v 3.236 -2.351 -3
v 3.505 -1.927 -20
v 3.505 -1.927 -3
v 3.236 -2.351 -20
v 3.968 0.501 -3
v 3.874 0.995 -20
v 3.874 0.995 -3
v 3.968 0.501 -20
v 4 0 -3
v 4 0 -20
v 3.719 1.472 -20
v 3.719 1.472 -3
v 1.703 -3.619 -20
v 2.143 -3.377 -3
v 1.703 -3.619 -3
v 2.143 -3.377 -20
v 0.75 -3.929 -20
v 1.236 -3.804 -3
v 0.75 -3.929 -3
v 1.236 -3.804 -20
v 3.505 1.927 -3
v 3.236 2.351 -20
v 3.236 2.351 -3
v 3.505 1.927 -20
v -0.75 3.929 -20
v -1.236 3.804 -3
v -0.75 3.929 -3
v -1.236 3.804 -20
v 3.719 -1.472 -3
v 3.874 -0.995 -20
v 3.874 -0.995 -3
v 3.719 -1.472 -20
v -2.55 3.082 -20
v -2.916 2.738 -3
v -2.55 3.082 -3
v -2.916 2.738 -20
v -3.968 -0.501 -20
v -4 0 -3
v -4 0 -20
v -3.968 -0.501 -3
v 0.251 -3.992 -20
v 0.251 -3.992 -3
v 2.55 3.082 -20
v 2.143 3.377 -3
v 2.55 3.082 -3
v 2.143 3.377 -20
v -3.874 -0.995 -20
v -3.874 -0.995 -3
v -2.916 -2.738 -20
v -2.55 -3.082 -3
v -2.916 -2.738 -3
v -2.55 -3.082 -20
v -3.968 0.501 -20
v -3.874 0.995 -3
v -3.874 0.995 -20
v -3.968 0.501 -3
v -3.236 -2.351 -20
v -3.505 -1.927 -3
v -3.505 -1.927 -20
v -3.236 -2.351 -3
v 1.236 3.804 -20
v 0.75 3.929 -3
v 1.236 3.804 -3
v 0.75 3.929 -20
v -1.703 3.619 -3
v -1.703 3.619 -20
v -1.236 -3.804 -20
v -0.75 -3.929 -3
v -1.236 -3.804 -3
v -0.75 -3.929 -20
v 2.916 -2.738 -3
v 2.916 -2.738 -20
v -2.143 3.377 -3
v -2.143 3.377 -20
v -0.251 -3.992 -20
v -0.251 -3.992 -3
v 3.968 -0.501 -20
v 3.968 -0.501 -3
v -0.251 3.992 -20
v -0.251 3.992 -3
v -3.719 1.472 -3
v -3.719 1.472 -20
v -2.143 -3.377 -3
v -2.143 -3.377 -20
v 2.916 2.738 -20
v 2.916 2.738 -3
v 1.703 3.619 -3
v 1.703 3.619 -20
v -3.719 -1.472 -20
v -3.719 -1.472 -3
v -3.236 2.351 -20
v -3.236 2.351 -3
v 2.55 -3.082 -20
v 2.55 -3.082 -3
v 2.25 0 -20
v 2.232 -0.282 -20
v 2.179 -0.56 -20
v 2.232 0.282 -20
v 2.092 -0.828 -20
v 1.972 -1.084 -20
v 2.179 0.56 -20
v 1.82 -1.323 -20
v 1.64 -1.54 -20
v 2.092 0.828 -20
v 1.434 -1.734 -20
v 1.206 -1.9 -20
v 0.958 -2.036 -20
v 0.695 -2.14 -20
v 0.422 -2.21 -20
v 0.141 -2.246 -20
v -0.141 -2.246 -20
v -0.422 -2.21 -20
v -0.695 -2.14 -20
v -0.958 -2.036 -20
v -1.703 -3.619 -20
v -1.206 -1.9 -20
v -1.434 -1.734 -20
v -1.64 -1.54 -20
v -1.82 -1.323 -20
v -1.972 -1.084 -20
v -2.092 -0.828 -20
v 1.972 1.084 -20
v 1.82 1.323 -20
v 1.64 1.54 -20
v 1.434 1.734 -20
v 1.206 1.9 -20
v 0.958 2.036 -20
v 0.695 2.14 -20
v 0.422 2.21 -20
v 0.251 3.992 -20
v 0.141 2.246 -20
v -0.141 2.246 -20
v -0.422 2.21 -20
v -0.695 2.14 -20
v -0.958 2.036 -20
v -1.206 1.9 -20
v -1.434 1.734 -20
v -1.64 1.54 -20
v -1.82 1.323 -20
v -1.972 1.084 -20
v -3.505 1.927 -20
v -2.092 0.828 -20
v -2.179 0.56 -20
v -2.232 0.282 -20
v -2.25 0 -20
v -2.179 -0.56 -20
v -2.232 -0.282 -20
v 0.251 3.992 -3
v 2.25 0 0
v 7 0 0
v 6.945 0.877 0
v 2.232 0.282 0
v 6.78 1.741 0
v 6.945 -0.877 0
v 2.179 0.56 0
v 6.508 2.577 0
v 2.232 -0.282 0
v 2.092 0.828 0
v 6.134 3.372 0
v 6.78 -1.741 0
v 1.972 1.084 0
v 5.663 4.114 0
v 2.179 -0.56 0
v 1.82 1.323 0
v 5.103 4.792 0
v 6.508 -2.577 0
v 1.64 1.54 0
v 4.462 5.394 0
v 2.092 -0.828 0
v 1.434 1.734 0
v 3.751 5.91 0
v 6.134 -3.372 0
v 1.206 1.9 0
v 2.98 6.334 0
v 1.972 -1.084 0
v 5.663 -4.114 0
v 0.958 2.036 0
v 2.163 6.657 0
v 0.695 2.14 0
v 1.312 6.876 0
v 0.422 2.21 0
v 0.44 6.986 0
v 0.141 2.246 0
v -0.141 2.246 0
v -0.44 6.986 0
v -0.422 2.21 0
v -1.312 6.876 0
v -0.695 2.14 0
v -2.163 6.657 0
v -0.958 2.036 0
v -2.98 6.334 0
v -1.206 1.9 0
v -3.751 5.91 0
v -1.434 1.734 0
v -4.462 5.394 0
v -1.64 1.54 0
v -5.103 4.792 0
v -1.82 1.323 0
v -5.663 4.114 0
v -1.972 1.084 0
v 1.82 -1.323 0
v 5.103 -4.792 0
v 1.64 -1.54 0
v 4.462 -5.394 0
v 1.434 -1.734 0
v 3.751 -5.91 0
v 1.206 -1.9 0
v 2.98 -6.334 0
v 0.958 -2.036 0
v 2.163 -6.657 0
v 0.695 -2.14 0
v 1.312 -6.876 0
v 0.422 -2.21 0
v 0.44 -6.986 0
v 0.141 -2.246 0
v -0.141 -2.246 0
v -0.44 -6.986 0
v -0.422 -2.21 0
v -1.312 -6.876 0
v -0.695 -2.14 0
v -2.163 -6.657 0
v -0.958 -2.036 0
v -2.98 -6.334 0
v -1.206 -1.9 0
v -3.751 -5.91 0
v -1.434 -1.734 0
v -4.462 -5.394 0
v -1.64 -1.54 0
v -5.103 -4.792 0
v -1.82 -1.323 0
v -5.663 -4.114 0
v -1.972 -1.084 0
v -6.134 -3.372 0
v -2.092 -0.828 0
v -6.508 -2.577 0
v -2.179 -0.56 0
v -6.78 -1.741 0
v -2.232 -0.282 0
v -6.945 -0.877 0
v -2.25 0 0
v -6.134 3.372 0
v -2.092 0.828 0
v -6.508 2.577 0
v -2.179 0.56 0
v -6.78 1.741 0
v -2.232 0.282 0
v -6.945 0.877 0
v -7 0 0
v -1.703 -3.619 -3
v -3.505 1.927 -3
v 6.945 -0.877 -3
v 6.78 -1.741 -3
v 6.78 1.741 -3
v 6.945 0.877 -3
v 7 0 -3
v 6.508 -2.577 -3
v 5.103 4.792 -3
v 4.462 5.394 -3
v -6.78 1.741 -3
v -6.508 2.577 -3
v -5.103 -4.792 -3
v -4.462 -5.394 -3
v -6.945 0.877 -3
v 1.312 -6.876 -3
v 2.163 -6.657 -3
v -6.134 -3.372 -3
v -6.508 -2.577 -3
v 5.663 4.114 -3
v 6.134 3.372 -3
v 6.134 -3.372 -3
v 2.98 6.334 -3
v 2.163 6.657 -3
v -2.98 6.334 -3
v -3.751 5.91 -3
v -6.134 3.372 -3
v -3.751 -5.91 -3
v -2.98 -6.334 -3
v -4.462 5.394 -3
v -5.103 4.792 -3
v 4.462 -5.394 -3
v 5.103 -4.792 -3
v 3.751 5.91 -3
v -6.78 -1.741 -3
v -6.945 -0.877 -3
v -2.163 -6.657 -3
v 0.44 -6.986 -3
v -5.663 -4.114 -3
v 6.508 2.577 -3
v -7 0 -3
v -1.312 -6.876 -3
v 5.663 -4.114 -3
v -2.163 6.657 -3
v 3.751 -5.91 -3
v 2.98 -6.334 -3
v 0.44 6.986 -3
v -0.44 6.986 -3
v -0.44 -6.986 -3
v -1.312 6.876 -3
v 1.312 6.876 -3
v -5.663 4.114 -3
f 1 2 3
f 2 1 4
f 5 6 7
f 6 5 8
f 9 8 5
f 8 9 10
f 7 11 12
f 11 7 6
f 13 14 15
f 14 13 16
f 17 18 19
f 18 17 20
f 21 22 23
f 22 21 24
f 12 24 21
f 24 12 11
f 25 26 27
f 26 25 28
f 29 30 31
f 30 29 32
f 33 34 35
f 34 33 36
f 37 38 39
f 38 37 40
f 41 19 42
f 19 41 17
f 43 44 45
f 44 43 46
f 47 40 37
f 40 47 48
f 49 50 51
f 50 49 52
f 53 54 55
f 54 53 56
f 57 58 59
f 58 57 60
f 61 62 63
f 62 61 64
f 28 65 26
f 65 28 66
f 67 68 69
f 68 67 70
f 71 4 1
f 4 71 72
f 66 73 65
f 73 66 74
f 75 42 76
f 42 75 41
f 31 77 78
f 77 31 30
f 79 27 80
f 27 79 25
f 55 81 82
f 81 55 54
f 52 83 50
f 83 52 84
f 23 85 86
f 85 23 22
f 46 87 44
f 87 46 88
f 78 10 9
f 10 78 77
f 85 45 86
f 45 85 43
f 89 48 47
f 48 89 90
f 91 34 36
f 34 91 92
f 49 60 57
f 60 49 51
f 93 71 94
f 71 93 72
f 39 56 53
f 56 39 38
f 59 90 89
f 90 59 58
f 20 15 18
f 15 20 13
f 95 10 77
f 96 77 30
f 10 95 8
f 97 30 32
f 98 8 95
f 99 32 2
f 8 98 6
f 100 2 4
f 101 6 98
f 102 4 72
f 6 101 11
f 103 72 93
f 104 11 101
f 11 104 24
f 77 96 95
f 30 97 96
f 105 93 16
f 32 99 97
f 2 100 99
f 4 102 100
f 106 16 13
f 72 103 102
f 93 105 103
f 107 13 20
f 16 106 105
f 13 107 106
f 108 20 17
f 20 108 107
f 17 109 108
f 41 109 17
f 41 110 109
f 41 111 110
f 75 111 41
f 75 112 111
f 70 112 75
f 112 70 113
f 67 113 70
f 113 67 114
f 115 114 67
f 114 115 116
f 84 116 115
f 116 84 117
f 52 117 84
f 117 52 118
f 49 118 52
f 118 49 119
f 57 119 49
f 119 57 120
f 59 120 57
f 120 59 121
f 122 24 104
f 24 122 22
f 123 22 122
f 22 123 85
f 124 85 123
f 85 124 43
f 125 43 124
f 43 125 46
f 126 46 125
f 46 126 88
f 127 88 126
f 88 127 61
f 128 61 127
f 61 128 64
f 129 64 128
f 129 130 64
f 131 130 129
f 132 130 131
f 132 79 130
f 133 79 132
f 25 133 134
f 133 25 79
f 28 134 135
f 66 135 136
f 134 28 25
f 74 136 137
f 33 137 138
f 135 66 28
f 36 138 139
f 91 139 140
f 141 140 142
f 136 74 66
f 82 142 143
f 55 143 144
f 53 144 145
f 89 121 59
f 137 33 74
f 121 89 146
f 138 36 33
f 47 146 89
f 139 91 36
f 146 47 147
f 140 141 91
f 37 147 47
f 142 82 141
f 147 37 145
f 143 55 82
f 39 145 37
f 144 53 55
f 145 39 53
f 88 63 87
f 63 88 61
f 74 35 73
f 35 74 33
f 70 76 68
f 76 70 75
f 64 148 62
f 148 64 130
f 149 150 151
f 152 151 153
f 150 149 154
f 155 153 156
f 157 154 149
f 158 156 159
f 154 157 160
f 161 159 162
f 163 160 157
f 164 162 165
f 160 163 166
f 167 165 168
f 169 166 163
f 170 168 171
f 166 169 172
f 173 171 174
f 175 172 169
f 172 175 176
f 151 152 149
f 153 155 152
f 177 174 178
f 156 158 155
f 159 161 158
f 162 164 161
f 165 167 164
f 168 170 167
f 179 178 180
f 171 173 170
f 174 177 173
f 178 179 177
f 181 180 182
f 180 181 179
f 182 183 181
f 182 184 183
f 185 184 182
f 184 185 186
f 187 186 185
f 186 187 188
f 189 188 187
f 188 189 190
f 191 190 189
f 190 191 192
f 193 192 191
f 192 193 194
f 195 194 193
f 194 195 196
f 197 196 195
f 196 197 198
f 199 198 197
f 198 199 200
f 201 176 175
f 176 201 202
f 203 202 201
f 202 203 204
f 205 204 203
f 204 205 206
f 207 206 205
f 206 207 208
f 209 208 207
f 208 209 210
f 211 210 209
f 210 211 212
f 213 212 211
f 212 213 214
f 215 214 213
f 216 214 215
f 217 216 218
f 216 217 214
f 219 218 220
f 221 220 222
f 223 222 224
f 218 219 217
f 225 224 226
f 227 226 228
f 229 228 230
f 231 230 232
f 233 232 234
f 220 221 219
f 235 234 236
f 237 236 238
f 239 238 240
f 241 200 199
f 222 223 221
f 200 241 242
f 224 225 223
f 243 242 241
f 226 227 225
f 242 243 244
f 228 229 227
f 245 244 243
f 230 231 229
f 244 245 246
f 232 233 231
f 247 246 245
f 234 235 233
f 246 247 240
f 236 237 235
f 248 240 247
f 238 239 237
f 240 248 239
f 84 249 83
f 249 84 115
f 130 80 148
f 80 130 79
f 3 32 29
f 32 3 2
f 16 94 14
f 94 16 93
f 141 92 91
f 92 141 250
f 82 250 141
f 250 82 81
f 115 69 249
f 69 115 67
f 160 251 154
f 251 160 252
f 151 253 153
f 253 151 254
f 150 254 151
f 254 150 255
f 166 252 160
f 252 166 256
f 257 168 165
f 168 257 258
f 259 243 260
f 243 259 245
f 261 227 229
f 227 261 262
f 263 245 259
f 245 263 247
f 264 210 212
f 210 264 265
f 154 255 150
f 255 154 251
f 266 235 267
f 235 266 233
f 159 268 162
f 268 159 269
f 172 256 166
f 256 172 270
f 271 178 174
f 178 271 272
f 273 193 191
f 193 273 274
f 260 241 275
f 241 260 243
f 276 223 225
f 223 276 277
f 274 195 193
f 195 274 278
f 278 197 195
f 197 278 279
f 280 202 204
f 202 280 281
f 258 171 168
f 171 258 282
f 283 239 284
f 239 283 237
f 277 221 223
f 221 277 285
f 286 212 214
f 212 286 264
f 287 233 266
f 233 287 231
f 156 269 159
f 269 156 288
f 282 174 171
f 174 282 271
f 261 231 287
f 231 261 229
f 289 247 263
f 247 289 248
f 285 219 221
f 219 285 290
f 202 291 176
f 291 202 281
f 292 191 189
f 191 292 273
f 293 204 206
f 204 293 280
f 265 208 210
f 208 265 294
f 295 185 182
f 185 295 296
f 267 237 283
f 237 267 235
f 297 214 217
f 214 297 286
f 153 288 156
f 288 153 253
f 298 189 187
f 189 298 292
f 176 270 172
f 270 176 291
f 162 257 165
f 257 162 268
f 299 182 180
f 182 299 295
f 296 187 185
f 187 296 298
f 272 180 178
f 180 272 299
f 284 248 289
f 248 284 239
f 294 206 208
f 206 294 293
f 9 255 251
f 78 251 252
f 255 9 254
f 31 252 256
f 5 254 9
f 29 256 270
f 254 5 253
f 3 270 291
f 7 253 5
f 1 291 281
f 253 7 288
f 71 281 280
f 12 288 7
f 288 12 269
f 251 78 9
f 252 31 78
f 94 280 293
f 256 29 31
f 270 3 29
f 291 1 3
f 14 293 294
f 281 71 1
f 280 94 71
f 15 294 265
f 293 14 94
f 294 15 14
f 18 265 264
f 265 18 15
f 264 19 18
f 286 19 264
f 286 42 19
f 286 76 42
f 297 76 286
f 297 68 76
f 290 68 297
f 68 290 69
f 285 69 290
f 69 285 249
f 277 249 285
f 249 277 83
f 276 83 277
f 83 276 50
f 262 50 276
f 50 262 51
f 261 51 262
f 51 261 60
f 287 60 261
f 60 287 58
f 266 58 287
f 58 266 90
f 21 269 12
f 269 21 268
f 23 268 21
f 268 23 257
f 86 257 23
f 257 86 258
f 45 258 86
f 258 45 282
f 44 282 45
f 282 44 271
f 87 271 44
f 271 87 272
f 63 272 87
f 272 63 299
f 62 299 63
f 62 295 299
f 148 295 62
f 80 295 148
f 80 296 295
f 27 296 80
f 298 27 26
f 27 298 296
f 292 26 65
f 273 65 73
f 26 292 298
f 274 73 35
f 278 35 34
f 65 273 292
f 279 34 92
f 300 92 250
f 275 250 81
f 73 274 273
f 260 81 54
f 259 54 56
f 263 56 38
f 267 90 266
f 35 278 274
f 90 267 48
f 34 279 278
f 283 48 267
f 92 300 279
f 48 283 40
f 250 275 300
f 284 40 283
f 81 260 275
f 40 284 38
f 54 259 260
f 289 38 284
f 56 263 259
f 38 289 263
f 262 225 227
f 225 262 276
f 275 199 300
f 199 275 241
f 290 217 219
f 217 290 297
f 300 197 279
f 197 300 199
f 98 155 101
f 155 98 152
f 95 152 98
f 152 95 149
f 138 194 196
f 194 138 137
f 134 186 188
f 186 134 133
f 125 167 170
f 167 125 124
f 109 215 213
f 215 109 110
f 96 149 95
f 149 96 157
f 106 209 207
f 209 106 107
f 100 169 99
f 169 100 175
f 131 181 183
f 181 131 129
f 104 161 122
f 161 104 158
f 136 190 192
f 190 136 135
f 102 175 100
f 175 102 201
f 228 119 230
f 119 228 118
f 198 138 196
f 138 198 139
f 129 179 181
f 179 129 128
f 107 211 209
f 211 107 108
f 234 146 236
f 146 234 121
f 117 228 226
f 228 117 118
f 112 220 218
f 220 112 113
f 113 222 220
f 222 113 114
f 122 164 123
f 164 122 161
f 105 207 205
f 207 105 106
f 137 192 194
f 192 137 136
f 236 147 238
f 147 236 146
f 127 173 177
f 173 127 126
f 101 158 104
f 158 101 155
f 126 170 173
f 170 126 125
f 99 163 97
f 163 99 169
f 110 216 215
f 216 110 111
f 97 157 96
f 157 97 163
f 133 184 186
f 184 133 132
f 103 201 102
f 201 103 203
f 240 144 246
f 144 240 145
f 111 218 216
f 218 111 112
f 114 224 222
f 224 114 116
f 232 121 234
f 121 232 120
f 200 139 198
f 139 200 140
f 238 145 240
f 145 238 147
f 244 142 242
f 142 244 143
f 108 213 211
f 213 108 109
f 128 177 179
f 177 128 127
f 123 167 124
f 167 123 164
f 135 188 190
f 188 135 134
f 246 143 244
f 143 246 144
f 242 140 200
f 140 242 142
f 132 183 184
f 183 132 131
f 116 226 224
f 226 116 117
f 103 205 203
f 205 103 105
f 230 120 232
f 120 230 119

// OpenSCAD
$fn = 50;


difference() {
	union() {
		translate(v = [0, 0, -20.0000000000]) {
			cylinder(h = 20, r = 4.0000000000);
		}
		translate(v = [0, 0, -3.0000000000]) {
			cylinder(h = 3, r = 7.0000000000);
		}
	}
	union() {
		#translate(v = [0, 0, -20]) {
			cylinder(h = 20, r = 2.2500000000);
		}
	}
}
